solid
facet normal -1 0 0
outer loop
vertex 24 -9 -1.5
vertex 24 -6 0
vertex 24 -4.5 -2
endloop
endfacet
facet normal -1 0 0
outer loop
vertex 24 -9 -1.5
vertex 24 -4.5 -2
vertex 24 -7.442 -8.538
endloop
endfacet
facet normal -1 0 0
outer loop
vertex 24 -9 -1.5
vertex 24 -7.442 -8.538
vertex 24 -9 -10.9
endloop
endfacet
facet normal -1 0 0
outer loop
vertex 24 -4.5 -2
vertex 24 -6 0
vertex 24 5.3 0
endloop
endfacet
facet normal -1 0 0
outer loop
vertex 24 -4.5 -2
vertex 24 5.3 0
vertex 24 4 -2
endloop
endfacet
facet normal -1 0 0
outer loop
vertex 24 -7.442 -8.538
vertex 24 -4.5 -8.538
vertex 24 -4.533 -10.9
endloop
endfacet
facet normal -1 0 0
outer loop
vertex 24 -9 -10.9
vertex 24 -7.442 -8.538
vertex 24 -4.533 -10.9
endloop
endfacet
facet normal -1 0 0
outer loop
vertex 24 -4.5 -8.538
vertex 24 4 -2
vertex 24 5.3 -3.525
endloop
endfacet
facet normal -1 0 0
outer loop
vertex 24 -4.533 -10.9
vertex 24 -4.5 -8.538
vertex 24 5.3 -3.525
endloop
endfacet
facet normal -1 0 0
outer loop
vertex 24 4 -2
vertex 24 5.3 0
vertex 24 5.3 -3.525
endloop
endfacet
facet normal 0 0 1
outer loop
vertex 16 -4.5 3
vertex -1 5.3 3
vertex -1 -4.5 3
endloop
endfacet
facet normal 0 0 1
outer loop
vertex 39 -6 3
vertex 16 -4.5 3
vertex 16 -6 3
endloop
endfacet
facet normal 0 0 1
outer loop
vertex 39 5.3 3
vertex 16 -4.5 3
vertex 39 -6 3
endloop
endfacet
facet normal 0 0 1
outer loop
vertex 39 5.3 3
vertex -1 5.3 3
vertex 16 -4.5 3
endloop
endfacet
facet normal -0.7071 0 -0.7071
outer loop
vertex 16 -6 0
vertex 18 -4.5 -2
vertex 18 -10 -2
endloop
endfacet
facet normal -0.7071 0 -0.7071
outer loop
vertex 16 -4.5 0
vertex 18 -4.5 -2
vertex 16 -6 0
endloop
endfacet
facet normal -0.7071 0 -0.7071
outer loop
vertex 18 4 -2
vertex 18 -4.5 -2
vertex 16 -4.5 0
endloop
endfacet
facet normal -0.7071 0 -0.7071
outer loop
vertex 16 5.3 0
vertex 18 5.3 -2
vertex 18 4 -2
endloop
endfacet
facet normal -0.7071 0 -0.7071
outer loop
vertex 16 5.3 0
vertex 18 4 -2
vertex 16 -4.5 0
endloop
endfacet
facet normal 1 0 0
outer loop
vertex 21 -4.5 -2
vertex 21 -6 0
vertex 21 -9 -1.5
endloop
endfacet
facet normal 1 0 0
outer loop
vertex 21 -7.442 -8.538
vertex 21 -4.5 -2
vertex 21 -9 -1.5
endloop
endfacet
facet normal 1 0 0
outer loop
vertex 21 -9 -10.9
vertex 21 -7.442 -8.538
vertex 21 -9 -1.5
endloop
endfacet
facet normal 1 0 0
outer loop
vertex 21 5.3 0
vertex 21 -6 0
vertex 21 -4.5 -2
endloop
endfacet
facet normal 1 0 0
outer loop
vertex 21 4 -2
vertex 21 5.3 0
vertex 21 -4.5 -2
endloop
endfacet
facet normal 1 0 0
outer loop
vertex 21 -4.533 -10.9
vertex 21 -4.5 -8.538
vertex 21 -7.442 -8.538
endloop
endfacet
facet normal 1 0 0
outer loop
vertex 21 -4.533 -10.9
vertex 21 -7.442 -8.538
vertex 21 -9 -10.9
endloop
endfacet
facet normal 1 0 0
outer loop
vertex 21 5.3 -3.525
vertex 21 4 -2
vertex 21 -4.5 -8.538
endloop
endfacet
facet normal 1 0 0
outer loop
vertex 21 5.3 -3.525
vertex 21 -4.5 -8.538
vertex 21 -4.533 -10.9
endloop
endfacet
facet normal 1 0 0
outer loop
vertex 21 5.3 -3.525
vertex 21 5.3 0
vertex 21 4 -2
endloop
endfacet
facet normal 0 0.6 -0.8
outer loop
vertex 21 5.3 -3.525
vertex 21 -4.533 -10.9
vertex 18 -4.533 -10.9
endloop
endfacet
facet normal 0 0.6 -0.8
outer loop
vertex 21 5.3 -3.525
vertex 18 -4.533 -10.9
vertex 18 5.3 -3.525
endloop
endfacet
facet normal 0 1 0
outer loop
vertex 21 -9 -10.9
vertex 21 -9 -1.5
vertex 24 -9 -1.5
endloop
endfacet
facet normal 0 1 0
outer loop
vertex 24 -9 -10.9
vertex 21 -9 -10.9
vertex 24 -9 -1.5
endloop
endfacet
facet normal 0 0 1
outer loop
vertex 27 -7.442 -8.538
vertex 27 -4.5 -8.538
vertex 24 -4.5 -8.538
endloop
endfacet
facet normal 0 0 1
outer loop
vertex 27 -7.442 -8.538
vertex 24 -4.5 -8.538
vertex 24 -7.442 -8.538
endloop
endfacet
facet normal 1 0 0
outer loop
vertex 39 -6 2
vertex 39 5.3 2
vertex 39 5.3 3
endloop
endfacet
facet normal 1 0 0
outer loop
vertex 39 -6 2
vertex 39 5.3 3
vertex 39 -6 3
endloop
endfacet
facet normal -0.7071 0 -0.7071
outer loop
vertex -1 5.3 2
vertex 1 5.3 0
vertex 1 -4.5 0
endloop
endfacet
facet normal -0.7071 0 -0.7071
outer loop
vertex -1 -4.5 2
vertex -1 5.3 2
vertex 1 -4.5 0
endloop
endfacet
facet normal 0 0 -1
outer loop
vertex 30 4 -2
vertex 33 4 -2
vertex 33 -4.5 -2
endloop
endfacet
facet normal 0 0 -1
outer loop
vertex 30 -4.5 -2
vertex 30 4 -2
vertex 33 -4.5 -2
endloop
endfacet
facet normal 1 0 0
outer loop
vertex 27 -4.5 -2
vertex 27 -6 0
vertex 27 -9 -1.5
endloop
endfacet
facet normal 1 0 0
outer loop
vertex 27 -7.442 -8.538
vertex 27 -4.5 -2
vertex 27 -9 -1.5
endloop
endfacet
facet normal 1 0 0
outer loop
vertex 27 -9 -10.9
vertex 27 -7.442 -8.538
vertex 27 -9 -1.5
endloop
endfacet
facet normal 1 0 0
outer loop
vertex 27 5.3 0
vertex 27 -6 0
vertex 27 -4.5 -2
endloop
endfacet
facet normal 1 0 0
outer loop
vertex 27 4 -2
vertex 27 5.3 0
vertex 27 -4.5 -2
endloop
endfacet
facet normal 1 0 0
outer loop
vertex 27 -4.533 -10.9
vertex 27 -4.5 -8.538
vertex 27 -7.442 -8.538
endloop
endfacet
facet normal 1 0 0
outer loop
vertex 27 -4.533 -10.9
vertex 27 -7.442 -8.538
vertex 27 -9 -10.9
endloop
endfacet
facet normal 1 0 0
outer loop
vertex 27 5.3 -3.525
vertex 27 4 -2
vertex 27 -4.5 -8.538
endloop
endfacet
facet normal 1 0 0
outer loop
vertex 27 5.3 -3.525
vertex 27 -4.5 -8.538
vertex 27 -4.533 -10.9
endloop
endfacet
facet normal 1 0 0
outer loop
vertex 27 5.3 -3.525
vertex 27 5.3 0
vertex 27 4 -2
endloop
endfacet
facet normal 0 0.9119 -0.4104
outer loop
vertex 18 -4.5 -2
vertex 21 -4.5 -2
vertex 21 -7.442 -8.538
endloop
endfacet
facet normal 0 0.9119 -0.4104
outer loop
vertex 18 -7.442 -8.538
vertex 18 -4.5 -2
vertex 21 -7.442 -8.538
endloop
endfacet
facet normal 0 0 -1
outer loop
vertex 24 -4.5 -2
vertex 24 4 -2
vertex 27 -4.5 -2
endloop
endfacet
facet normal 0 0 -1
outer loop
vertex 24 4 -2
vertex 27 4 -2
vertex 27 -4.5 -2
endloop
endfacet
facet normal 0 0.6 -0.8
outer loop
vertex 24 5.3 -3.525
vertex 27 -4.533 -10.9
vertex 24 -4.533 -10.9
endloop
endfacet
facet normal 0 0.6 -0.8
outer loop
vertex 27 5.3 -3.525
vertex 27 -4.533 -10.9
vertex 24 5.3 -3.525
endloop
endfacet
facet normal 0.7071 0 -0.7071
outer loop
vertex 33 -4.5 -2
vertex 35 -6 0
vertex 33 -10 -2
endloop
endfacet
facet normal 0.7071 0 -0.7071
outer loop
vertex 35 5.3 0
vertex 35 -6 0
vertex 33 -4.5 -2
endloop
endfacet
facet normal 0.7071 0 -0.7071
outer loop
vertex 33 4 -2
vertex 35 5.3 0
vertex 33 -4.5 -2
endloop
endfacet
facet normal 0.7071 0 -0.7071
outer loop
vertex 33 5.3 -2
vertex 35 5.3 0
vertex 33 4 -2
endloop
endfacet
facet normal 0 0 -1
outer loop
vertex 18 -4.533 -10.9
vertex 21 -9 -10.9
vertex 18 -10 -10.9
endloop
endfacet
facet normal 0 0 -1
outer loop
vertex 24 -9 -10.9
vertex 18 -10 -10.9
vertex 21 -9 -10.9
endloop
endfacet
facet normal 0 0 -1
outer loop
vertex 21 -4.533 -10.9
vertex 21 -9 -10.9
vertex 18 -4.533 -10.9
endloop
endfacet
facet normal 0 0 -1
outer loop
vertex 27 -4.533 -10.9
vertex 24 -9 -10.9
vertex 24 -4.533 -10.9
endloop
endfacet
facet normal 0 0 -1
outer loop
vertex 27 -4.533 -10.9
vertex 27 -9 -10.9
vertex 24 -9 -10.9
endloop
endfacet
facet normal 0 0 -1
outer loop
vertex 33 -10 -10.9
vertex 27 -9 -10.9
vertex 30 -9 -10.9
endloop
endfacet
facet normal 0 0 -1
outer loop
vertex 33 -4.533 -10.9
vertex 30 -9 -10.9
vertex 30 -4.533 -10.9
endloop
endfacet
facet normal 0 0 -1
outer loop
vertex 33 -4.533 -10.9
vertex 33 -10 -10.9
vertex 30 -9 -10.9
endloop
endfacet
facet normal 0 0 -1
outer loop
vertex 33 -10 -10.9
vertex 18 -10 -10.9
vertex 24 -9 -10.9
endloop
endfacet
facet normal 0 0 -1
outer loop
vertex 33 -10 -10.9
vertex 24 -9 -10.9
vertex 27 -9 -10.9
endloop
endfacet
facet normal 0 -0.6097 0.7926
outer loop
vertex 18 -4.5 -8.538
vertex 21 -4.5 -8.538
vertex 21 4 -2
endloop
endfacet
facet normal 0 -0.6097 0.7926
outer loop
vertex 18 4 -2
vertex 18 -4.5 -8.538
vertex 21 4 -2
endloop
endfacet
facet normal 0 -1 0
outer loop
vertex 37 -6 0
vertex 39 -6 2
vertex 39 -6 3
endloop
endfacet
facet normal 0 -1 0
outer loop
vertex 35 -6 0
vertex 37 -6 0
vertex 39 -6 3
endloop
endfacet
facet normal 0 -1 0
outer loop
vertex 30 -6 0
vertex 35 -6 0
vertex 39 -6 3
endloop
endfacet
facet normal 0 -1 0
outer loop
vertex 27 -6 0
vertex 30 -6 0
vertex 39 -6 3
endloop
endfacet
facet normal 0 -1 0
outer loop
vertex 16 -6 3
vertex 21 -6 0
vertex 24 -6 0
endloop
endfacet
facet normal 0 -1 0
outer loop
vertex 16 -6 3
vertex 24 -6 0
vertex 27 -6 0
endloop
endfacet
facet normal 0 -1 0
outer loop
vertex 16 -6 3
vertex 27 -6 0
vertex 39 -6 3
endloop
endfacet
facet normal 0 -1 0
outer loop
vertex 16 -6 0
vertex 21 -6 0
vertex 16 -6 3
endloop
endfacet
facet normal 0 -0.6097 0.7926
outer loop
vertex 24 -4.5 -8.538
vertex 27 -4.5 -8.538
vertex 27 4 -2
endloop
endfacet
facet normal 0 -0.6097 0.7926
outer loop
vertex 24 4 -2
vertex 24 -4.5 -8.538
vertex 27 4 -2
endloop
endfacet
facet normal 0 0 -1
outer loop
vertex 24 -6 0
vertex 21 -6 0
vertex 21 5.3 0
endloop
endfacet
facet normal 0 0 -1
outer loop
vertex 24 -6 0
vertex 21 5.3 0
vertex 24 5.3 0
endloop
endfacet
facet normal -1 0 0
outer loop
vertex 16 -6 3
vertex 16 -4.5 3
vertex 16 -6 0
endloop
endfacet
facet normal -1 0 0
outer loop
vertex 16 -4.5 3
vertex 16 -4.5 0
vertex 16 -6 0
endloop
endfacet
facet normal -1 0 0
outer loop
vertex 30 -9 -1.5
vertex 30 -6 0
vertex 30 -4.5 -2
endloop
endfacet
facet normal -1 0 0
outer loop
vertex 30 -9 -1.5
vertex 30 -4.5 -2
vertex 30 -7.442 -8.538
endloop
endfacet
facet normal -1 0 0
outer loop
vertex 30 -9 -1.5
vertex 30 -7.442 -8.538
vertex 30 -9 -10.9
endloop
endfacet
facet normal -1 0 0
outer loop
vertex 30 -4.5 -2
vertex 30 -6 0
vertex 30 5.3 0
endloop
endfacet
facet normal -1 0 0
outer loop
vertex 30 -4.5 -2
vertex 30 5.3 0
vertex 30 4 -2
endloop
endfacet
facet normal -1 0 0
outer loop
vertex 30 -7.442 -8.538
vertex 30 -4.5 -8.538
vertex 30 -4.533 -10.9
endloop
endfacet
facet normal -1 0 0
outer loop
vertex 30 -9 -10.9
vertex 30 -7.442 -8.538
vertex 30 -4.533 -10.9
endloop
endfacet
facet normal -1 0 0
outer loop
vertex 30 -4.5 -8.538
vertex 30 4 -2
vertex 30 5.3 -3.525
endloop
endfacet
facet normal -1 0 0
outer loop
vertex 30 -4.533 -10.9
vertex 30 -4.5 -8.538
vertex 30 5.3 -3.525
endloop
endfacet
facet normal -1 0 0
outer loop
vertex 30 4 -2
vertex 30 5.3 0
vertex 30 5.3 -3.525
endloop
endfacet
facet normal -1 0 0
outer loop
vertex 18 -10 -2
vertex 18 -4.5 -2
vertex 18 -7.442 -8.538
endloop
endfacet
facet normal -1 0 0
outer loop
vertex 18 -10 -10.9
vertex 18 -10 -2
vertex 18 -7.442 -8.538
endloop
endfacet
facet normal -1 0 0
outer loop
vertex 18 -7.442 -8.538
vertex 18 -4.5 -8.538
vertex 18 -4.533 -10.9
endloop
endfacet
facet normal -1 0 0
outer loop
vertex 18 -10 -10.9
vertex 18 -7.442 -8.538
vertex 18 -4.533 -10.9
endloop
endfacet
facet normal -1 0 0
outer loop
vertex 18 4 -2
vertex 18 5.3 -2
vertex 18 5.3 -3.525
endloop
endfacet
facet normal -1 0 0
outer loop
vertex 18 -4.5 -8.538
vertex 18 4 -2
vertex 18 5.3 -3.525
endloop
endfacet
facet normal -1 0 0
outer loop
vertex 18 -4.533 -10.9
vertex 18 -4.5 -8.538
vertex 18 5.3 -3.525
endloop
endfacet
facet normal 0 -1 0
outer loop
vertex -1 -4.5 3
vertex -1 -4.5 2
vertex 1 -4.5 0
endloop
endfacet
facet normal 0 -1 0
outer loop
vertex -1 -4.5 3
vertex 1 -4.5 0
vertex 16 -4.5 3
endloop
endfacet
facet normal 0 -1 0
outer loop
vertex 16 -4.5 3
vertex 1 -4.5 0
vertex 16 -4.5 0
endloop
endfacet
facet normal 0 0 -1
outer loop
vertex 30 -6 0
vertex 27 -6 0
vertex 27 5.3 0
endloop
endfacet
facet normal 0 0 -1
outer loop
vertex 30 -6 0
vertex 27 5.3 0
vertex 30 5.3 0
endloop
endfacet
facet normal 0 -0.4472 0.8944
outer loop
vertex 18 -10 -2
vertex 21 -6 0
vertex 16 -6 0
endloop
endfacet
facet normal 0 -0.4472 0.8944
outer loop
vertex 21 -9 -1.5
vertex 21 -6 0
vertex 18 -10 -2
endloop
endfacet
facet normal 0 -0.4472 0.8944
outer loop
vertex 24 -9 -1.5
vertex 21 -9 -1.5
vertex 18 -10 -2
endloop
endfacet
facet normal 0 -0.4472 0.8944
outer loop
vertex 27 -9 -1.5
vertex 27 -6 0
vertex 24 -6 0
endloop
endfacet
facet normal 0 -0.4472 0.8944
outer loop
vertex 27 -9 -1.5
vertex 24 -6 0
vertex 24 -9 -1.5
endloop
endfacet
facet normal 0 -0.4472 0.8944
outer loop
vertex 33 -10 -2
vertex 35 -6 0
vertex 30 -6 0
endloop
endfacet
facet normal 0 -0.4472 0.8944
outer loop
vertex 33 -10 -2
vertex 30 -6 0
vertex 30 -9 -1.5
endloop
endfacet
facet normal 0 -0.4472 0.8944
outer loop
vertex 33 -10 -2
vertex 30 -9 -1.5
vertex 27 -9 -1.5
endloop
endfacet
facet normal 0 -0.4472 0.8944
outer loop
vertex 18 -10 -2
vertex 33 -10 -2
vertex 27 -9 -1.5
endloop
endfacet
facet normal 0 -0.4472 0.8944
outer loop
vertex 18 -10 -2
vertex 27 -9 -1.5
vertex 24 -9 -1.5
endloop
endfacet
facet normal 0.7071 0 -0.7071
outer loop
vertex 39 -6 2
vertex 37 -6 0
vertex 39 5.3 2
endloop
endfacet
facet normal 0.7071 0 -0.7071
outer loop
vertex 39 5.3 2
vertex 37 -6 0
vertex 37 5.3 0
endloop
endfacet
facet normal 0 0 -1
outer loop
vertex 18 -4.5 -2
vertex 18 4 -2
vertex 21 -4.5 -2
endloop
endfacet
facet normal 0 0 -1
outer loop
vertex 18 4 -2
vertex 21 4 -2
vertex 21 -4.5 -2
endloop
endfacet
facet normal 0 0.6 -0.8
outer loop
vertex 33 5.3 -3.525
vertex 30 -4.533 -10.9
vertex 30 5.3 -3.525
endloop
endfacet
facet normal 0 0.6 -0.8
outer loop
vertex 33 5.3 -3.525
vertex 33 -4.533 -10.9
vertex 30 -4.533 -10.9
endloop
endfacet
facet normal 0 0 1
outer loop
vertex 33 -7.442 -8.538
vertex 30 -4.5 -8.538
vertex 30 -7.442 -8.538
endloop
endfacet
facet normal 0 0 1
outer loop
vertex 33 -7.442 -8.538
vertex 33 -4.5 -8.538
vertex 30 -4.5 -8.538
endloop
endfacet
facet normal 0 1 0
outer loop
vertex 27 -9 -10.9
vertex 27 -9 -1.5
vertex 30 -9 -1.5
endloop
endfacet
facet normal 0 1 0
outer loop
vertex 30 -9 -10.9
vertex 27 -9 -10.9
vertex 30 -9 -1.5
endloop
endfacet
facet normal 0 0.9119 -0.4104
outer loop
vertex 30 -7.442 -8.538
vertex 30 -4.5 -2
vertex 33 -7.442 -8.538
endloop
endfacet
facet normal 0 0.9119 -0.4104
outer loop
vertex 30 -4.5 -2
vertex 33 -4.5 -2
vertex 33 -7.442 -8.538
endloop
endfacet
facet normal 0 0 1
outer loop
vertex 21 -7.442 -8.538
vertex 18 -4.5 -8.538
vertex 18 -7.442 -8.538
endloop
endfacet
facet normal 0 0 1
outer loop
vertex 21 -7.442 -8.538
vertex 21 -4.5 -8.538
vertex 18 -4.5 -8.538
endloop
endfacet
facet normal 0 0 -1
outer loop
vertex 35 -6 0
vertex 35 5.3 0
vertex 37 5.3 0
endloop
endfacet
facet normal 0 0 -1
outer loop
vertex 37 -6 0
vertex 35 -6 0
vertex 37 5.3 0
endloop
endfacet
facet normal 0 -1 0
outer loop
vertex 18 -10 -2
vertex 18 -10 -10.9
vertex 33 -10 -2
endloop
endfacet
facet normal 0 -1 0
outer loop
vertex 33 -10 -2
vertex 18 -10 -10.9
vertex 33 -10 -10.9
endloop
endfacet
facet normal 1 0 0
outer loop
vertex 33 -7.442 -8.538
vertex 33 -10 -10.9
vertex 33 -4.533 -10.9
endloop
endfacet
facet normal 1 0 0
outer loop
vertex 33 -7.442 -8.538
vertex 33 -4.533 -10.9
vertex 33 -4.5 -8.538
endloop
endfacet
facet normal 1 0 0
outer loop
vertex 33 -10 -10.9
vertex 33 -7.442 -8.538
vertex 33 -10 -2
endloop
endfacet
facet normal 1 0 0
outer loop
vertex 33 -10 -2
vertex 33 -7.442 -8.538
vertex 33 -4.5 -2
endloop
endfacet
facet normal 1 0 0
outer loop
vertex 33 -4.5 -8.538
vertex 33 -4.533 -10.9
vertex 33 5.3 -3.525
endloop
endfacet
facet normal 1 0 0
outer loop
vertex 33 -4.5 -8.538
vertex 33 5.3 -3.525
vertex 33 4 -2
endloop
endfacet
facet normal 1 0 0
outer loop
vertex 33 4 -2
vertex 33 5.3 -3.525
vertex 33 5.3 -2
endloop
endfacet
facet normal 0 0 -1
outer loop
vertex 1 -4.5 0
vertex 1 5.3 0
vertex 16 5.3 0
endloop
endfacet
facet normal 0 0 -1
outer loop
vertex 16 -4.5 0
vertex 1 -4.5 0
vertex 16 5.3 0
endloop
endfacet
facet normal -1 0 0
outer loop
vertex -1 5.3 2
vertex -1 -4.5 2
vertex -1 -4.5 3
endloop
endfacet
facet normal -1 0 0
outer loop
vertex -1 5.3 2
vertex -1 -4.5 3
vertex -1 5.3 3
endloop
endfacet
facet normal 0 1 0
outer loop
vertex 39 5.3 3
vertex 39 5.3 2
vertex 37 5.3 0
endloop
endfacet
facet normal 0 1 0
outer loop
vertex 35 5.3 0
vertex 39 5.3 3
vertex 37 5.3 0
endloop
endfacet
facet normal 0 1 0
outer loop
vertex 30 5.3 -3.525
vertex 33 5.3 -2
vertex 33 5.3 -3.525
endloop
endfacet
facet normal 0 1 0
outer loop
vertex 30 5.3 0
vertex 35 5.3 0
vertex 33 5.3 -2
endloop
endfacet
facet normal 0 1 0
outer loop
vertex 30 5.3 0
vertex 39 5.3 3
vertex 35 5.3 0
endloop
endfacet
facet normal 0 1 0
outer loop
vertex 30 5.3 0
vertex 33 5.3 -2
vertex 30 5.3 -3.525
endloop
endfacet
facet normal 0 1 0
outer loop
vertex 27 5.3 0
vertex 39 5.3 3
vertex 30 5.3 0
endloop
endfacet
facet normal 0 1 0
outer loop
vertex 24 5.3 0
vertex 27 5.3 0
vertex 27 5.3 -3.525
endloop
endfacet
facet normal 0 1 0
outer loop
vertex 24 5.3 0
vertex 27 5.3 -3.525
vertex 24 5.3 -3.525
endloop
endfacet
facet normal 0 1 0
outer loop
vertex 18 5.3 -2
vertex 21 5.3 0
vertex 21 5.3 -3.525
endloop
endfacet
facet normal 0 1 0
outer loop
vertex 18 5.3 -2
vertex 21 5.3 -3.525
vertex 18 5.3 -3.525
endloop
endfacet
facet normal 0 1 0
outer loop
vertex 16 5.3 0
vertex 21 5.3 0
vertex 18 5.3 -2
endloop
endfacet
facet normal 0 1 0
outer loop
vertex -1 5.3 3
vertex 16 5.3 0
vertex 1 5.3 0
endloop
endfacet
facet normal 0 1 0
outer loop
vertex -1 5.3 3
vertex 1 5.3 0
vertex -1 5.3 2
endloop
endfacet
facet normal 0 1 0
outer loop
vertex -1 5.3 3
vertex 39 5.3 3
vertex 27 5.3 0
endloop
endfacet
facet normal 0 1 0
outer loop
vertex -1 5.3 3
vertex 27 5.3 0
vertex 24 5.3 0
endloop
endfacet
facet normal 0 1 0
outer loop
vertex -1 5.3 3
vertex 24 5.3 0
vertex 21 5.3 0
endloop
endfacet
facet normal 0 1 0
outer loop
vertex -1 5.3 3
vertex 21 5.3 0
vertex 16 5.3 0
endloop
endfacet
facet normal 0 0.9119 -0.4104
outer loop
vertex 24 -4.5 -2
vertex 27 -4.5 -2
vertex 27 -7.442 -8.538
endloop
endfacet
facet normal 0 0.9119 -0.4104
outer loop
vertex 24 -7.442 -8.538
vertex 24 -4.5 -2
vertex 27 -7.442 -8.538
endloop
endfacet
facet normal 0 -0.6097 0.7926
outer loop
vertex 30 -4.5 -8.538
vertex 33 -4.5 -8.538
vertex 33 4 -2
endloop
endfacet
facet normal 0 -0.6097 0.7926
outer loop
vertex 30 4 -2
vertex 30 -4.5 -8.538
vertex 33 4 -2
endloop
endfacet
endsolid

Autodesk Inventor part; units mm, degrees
ref_plane "YZ Plane" through (0, 0, 0) normal (1, 0, 0) x (0, 1, 0)
ref_plane "XZ Plane" through (0, 0, 0) normal (0, 1, 0) x (-1, 0, 0)
ref_plane "XY Plane" through (0, 0, 0) normal (0, 0, 1) x (1, 0, 0)
sketch "Sketch1" plane through (0, 0, 0) normal (0, 0, 1) x (1, 0, 0)
  line L0 (0, 0) -> (5, 0)
  line L1 (5, 0) -> (19, 0)
  line L2 (19, 0) -> (33, 0)
  line L3 (33, 0) -> (28, 0)
  circle A0 centre (5, 0) radius 5
  circle A1 centre (19, 0) radius 5
  circle A2 centre (33, 0) radius 5
  line L4 (0, 0) -> (-1, 0)
  line L5 (38, 0) -> (39, 0)
  line L6 (33, -5) -> (33, -6)
  line L7 (-1, 6) -> (39, 6)
  line L8 (39, 6) -> (39, -6)
  line L9 (39, -6) -> (-1, -6)
  line L10 (-1, -6) -> (-1, 6)
  dimension "d0" = 5
  dimension "d1" = 14
  dimension "d2" = 14
  dimension "d3" = 5
  dimension "d4" = 10
  dimension "d5" = 10
  dimension "d6" = 10
  dimension "d9" = 1
  dimension "d10" = 1
  dimension "d11" = 1
extrude "Extrusion1" add sketch "Sketch1" along normal blind 3
sketch "Sketch2" plane through (-1, 6, 0) normal (0, 1, 0) x (1, 0, 0)
  line L0 (0, -3) -> (40, -3) projected
  line L1 (19, 2) -> (19, 12)
  line L2 (19, 12) -> (34, 12)
  line L3 (34, 12) -> (34, 2)
  line L4 (34, 0) -> (19, 0)
  line L5 (40, 0) -> (36, 0)
  line L6 (36, 0) -> (34, 2)
  line L7 (0, 0) -> (40, 0) projected
  line L8 (17, 0) -> (0, 0)
  line L9 (19, 2) -> (17, 0)
  line L10 (36, 0) -> (17, 0)
  point P0 (1, 0)
  dimension "d16" = 12
  dimension "d17" = 2
  dimension "d19" = 2
  dimension "d20" = 2
extrude "Extrusion2" add sketch "Sketch2" against normal blind 16
sketch "Sketch3" plane through (-1, 6, 3) normal (0, 1, 0) x (1, 0, 0)
  line L0 (34, 5) -> (34, 15) projected
  line L1 (34, 5) -> (34, -8.5215)
  line L2 (34, -8.5215) -> (31, -8.5215)
  line L3 (31, -8.5215) -> (28, -8.5215)
  line L4 (28, -8.5215) -> (25, -8.5215)
  line L5 (25, -8.5215) -> (22, -8.5215)
  line L6 (22, -8.5215) -> (19, -8.5215)
  line L7 (34, 5) -> (34, 3)
  line L8 (17, 3) -> (36, 3) projected
  line L9 (31, 3) -> (31, 15)
  line L10 (34, 15) -> (19, 15) projected
  line L11 (31, 15) -> (34, 15)
  line L12 (34, 15) -> (34, 5)
  line L13 (34, 3) -> (31, 3)
  line L14 (31, 3) -> (28, 3)
  line L15 (28, 3) -> (28, 15)
  line L16 (28, 15) -> (31, 15)
  line L17 (28, 3) -> (25, 3)
  line L18 (25, 3) -> (25, 15)
  line L19 (25, 15) -> (28, 15)
  line L20 (25, 3) -> (22, 3)
  line L21 (22, 3) -> (22, 15)
  line L22 (22, 15) -> (25, 15)
  line L23 (22, 3) -> (19, 3)
  line L24 (19, 15) -> (19, 5) projected
  line L25 (19, 3) -> (19, 15)
  line L26 (19, 15) -> (22, 15)
  point P0 (1, 3)
  dimension "d27" = 3
  dimension "d28" = 3
  dimension "d29" = 3
  dimension "d30" = 3
  dimension "d31" = 3
extrude "Extrusion3" cut sketch "Sketch3" against normal blind 15 contours L9 L8 L15 L10 | L18 L8 L21 L10
sketch "Sketch4" plane through (39, -6, 0) normal (1, 0, 0) x (0, 0, -1)
  line L0 (2, 12) -> (2, -4) projected
  line L1 (0, 0) -> (2, -4)
  line L2 (2, -4) -> (2, 0)
  line L3 (0, 0) -> (2, 0)
  line L4 (2, 12) -> (2, 10)
  line L5 (12, -3) -> (2, 10)
  line L6 (2, 0) -> (2, 1.5)
  line L7 (2, 10) -> (2, 1.5)
  line L8 (2, 1.5) -> (12, -3)
  line L9 (2, 12) -> (12, 12) projected
  line L10 (12, 12) -> (12, -4) projected
  line L11 (12, -3) -> (12, -1)
  line L12 (12, -1) -> (12, 0)
  line L13 (12, 0) -> (3, 12)
  line L14 (2, 12) -> (3, 12)
  line L15 (3, 12) -> (12, 12)
  line L16 (12, 12) -> (12, 0)
  line L17 (0, 0) -> (0, -3) projected
  line L18 (0, 0) -> (0, -4) projected
  line L19 (0, 0) -> (0, -4)
  line L20 (2, -4) -> (0, -4) projected
  line L21 (0, -4) -> (2, -4)
  line L22 (8.5385, 1.5) -> (8.5385, -1.4423)
  point P0 (0, 6)
  dimension "d34" = 2
  dimension "d35" = 1.5
  dimension "d37" = 2
  dimension "d38" = 1
extrude "Extrusion5" cut sketch "Sketch4" against normal blind 25 contours L5 L22 L8 L0 | L9 L10 L13 | L20 L18 L17 L1
chamfer "Chamfer1" distance 2 angle 45 1 edges at (-1, 0, 0)
chamfer "Chamfer2" distance 2 angle 45 1 edges at (39, 0, 0)
sketch "Sketch5" plane through (33, 6, -2) normal (1, 0, 0) x (0, 0, -1)
  line L0 (10, -16) -> (0, -16) projected
  line L1 (10, -16) -> (8.9, -16)
  line L2 (8.9, -16) -> (8.9, -9)
  line L3 (8.9, -9) -> (10, -9)
  line L4 (10, -9) -> (10, -16)
  point P0 (-2, -6)
  dimension "d49" = 1.1
  dimension "d50" = 7
extrude "Extrusion6" cut sketch "Sketch5" against normal blind 15
sketch "Sketch6" plane through (0, 0, 0) normal (0, 0, -1) x (-1, 0, 0)
  line L0 (-1, -6) -> (-16, -6) projected
  line L1 (1, 6) -> (1, -6) projected
  line L2 (-16, -6) -> (1, -6)
  line L3 (1, -6) -> (1, -4.5)
  line L4 (1, -4.5) -> (-16, -4.5)
  line L5 (-16, -4.5) -> (-16, -6)
  point P0 (0, 0)
  dimension "d53" = 1.5
extrude "Extrusion7" cut sketch "Sketch6" against normal blind 10
sketch "Sketch7" plane through (0, 0, 3) normal (0, 0, 1) x (1, 0, 0)
  line L0 (39, 6) -> (-1, 6) projected
  line L1 (39, -6) -> (39, 6) projected
  line L2 (-1, 6) -> (39, 6)
  line L3 (39, 6) -> (39, 5.3)
  line L4 (39, 5.3) -> (-1, 5.3)
  line L5 (-1, 5.3) -> (-1, 6)
  point P0 (0, 0)
  dimension "d56" = 0.7
extrude "Extrusion8" cut sketch "Sketch7" against normal blind 10
equation "\"d20\" = d19"
properties part number "StandBtn"
